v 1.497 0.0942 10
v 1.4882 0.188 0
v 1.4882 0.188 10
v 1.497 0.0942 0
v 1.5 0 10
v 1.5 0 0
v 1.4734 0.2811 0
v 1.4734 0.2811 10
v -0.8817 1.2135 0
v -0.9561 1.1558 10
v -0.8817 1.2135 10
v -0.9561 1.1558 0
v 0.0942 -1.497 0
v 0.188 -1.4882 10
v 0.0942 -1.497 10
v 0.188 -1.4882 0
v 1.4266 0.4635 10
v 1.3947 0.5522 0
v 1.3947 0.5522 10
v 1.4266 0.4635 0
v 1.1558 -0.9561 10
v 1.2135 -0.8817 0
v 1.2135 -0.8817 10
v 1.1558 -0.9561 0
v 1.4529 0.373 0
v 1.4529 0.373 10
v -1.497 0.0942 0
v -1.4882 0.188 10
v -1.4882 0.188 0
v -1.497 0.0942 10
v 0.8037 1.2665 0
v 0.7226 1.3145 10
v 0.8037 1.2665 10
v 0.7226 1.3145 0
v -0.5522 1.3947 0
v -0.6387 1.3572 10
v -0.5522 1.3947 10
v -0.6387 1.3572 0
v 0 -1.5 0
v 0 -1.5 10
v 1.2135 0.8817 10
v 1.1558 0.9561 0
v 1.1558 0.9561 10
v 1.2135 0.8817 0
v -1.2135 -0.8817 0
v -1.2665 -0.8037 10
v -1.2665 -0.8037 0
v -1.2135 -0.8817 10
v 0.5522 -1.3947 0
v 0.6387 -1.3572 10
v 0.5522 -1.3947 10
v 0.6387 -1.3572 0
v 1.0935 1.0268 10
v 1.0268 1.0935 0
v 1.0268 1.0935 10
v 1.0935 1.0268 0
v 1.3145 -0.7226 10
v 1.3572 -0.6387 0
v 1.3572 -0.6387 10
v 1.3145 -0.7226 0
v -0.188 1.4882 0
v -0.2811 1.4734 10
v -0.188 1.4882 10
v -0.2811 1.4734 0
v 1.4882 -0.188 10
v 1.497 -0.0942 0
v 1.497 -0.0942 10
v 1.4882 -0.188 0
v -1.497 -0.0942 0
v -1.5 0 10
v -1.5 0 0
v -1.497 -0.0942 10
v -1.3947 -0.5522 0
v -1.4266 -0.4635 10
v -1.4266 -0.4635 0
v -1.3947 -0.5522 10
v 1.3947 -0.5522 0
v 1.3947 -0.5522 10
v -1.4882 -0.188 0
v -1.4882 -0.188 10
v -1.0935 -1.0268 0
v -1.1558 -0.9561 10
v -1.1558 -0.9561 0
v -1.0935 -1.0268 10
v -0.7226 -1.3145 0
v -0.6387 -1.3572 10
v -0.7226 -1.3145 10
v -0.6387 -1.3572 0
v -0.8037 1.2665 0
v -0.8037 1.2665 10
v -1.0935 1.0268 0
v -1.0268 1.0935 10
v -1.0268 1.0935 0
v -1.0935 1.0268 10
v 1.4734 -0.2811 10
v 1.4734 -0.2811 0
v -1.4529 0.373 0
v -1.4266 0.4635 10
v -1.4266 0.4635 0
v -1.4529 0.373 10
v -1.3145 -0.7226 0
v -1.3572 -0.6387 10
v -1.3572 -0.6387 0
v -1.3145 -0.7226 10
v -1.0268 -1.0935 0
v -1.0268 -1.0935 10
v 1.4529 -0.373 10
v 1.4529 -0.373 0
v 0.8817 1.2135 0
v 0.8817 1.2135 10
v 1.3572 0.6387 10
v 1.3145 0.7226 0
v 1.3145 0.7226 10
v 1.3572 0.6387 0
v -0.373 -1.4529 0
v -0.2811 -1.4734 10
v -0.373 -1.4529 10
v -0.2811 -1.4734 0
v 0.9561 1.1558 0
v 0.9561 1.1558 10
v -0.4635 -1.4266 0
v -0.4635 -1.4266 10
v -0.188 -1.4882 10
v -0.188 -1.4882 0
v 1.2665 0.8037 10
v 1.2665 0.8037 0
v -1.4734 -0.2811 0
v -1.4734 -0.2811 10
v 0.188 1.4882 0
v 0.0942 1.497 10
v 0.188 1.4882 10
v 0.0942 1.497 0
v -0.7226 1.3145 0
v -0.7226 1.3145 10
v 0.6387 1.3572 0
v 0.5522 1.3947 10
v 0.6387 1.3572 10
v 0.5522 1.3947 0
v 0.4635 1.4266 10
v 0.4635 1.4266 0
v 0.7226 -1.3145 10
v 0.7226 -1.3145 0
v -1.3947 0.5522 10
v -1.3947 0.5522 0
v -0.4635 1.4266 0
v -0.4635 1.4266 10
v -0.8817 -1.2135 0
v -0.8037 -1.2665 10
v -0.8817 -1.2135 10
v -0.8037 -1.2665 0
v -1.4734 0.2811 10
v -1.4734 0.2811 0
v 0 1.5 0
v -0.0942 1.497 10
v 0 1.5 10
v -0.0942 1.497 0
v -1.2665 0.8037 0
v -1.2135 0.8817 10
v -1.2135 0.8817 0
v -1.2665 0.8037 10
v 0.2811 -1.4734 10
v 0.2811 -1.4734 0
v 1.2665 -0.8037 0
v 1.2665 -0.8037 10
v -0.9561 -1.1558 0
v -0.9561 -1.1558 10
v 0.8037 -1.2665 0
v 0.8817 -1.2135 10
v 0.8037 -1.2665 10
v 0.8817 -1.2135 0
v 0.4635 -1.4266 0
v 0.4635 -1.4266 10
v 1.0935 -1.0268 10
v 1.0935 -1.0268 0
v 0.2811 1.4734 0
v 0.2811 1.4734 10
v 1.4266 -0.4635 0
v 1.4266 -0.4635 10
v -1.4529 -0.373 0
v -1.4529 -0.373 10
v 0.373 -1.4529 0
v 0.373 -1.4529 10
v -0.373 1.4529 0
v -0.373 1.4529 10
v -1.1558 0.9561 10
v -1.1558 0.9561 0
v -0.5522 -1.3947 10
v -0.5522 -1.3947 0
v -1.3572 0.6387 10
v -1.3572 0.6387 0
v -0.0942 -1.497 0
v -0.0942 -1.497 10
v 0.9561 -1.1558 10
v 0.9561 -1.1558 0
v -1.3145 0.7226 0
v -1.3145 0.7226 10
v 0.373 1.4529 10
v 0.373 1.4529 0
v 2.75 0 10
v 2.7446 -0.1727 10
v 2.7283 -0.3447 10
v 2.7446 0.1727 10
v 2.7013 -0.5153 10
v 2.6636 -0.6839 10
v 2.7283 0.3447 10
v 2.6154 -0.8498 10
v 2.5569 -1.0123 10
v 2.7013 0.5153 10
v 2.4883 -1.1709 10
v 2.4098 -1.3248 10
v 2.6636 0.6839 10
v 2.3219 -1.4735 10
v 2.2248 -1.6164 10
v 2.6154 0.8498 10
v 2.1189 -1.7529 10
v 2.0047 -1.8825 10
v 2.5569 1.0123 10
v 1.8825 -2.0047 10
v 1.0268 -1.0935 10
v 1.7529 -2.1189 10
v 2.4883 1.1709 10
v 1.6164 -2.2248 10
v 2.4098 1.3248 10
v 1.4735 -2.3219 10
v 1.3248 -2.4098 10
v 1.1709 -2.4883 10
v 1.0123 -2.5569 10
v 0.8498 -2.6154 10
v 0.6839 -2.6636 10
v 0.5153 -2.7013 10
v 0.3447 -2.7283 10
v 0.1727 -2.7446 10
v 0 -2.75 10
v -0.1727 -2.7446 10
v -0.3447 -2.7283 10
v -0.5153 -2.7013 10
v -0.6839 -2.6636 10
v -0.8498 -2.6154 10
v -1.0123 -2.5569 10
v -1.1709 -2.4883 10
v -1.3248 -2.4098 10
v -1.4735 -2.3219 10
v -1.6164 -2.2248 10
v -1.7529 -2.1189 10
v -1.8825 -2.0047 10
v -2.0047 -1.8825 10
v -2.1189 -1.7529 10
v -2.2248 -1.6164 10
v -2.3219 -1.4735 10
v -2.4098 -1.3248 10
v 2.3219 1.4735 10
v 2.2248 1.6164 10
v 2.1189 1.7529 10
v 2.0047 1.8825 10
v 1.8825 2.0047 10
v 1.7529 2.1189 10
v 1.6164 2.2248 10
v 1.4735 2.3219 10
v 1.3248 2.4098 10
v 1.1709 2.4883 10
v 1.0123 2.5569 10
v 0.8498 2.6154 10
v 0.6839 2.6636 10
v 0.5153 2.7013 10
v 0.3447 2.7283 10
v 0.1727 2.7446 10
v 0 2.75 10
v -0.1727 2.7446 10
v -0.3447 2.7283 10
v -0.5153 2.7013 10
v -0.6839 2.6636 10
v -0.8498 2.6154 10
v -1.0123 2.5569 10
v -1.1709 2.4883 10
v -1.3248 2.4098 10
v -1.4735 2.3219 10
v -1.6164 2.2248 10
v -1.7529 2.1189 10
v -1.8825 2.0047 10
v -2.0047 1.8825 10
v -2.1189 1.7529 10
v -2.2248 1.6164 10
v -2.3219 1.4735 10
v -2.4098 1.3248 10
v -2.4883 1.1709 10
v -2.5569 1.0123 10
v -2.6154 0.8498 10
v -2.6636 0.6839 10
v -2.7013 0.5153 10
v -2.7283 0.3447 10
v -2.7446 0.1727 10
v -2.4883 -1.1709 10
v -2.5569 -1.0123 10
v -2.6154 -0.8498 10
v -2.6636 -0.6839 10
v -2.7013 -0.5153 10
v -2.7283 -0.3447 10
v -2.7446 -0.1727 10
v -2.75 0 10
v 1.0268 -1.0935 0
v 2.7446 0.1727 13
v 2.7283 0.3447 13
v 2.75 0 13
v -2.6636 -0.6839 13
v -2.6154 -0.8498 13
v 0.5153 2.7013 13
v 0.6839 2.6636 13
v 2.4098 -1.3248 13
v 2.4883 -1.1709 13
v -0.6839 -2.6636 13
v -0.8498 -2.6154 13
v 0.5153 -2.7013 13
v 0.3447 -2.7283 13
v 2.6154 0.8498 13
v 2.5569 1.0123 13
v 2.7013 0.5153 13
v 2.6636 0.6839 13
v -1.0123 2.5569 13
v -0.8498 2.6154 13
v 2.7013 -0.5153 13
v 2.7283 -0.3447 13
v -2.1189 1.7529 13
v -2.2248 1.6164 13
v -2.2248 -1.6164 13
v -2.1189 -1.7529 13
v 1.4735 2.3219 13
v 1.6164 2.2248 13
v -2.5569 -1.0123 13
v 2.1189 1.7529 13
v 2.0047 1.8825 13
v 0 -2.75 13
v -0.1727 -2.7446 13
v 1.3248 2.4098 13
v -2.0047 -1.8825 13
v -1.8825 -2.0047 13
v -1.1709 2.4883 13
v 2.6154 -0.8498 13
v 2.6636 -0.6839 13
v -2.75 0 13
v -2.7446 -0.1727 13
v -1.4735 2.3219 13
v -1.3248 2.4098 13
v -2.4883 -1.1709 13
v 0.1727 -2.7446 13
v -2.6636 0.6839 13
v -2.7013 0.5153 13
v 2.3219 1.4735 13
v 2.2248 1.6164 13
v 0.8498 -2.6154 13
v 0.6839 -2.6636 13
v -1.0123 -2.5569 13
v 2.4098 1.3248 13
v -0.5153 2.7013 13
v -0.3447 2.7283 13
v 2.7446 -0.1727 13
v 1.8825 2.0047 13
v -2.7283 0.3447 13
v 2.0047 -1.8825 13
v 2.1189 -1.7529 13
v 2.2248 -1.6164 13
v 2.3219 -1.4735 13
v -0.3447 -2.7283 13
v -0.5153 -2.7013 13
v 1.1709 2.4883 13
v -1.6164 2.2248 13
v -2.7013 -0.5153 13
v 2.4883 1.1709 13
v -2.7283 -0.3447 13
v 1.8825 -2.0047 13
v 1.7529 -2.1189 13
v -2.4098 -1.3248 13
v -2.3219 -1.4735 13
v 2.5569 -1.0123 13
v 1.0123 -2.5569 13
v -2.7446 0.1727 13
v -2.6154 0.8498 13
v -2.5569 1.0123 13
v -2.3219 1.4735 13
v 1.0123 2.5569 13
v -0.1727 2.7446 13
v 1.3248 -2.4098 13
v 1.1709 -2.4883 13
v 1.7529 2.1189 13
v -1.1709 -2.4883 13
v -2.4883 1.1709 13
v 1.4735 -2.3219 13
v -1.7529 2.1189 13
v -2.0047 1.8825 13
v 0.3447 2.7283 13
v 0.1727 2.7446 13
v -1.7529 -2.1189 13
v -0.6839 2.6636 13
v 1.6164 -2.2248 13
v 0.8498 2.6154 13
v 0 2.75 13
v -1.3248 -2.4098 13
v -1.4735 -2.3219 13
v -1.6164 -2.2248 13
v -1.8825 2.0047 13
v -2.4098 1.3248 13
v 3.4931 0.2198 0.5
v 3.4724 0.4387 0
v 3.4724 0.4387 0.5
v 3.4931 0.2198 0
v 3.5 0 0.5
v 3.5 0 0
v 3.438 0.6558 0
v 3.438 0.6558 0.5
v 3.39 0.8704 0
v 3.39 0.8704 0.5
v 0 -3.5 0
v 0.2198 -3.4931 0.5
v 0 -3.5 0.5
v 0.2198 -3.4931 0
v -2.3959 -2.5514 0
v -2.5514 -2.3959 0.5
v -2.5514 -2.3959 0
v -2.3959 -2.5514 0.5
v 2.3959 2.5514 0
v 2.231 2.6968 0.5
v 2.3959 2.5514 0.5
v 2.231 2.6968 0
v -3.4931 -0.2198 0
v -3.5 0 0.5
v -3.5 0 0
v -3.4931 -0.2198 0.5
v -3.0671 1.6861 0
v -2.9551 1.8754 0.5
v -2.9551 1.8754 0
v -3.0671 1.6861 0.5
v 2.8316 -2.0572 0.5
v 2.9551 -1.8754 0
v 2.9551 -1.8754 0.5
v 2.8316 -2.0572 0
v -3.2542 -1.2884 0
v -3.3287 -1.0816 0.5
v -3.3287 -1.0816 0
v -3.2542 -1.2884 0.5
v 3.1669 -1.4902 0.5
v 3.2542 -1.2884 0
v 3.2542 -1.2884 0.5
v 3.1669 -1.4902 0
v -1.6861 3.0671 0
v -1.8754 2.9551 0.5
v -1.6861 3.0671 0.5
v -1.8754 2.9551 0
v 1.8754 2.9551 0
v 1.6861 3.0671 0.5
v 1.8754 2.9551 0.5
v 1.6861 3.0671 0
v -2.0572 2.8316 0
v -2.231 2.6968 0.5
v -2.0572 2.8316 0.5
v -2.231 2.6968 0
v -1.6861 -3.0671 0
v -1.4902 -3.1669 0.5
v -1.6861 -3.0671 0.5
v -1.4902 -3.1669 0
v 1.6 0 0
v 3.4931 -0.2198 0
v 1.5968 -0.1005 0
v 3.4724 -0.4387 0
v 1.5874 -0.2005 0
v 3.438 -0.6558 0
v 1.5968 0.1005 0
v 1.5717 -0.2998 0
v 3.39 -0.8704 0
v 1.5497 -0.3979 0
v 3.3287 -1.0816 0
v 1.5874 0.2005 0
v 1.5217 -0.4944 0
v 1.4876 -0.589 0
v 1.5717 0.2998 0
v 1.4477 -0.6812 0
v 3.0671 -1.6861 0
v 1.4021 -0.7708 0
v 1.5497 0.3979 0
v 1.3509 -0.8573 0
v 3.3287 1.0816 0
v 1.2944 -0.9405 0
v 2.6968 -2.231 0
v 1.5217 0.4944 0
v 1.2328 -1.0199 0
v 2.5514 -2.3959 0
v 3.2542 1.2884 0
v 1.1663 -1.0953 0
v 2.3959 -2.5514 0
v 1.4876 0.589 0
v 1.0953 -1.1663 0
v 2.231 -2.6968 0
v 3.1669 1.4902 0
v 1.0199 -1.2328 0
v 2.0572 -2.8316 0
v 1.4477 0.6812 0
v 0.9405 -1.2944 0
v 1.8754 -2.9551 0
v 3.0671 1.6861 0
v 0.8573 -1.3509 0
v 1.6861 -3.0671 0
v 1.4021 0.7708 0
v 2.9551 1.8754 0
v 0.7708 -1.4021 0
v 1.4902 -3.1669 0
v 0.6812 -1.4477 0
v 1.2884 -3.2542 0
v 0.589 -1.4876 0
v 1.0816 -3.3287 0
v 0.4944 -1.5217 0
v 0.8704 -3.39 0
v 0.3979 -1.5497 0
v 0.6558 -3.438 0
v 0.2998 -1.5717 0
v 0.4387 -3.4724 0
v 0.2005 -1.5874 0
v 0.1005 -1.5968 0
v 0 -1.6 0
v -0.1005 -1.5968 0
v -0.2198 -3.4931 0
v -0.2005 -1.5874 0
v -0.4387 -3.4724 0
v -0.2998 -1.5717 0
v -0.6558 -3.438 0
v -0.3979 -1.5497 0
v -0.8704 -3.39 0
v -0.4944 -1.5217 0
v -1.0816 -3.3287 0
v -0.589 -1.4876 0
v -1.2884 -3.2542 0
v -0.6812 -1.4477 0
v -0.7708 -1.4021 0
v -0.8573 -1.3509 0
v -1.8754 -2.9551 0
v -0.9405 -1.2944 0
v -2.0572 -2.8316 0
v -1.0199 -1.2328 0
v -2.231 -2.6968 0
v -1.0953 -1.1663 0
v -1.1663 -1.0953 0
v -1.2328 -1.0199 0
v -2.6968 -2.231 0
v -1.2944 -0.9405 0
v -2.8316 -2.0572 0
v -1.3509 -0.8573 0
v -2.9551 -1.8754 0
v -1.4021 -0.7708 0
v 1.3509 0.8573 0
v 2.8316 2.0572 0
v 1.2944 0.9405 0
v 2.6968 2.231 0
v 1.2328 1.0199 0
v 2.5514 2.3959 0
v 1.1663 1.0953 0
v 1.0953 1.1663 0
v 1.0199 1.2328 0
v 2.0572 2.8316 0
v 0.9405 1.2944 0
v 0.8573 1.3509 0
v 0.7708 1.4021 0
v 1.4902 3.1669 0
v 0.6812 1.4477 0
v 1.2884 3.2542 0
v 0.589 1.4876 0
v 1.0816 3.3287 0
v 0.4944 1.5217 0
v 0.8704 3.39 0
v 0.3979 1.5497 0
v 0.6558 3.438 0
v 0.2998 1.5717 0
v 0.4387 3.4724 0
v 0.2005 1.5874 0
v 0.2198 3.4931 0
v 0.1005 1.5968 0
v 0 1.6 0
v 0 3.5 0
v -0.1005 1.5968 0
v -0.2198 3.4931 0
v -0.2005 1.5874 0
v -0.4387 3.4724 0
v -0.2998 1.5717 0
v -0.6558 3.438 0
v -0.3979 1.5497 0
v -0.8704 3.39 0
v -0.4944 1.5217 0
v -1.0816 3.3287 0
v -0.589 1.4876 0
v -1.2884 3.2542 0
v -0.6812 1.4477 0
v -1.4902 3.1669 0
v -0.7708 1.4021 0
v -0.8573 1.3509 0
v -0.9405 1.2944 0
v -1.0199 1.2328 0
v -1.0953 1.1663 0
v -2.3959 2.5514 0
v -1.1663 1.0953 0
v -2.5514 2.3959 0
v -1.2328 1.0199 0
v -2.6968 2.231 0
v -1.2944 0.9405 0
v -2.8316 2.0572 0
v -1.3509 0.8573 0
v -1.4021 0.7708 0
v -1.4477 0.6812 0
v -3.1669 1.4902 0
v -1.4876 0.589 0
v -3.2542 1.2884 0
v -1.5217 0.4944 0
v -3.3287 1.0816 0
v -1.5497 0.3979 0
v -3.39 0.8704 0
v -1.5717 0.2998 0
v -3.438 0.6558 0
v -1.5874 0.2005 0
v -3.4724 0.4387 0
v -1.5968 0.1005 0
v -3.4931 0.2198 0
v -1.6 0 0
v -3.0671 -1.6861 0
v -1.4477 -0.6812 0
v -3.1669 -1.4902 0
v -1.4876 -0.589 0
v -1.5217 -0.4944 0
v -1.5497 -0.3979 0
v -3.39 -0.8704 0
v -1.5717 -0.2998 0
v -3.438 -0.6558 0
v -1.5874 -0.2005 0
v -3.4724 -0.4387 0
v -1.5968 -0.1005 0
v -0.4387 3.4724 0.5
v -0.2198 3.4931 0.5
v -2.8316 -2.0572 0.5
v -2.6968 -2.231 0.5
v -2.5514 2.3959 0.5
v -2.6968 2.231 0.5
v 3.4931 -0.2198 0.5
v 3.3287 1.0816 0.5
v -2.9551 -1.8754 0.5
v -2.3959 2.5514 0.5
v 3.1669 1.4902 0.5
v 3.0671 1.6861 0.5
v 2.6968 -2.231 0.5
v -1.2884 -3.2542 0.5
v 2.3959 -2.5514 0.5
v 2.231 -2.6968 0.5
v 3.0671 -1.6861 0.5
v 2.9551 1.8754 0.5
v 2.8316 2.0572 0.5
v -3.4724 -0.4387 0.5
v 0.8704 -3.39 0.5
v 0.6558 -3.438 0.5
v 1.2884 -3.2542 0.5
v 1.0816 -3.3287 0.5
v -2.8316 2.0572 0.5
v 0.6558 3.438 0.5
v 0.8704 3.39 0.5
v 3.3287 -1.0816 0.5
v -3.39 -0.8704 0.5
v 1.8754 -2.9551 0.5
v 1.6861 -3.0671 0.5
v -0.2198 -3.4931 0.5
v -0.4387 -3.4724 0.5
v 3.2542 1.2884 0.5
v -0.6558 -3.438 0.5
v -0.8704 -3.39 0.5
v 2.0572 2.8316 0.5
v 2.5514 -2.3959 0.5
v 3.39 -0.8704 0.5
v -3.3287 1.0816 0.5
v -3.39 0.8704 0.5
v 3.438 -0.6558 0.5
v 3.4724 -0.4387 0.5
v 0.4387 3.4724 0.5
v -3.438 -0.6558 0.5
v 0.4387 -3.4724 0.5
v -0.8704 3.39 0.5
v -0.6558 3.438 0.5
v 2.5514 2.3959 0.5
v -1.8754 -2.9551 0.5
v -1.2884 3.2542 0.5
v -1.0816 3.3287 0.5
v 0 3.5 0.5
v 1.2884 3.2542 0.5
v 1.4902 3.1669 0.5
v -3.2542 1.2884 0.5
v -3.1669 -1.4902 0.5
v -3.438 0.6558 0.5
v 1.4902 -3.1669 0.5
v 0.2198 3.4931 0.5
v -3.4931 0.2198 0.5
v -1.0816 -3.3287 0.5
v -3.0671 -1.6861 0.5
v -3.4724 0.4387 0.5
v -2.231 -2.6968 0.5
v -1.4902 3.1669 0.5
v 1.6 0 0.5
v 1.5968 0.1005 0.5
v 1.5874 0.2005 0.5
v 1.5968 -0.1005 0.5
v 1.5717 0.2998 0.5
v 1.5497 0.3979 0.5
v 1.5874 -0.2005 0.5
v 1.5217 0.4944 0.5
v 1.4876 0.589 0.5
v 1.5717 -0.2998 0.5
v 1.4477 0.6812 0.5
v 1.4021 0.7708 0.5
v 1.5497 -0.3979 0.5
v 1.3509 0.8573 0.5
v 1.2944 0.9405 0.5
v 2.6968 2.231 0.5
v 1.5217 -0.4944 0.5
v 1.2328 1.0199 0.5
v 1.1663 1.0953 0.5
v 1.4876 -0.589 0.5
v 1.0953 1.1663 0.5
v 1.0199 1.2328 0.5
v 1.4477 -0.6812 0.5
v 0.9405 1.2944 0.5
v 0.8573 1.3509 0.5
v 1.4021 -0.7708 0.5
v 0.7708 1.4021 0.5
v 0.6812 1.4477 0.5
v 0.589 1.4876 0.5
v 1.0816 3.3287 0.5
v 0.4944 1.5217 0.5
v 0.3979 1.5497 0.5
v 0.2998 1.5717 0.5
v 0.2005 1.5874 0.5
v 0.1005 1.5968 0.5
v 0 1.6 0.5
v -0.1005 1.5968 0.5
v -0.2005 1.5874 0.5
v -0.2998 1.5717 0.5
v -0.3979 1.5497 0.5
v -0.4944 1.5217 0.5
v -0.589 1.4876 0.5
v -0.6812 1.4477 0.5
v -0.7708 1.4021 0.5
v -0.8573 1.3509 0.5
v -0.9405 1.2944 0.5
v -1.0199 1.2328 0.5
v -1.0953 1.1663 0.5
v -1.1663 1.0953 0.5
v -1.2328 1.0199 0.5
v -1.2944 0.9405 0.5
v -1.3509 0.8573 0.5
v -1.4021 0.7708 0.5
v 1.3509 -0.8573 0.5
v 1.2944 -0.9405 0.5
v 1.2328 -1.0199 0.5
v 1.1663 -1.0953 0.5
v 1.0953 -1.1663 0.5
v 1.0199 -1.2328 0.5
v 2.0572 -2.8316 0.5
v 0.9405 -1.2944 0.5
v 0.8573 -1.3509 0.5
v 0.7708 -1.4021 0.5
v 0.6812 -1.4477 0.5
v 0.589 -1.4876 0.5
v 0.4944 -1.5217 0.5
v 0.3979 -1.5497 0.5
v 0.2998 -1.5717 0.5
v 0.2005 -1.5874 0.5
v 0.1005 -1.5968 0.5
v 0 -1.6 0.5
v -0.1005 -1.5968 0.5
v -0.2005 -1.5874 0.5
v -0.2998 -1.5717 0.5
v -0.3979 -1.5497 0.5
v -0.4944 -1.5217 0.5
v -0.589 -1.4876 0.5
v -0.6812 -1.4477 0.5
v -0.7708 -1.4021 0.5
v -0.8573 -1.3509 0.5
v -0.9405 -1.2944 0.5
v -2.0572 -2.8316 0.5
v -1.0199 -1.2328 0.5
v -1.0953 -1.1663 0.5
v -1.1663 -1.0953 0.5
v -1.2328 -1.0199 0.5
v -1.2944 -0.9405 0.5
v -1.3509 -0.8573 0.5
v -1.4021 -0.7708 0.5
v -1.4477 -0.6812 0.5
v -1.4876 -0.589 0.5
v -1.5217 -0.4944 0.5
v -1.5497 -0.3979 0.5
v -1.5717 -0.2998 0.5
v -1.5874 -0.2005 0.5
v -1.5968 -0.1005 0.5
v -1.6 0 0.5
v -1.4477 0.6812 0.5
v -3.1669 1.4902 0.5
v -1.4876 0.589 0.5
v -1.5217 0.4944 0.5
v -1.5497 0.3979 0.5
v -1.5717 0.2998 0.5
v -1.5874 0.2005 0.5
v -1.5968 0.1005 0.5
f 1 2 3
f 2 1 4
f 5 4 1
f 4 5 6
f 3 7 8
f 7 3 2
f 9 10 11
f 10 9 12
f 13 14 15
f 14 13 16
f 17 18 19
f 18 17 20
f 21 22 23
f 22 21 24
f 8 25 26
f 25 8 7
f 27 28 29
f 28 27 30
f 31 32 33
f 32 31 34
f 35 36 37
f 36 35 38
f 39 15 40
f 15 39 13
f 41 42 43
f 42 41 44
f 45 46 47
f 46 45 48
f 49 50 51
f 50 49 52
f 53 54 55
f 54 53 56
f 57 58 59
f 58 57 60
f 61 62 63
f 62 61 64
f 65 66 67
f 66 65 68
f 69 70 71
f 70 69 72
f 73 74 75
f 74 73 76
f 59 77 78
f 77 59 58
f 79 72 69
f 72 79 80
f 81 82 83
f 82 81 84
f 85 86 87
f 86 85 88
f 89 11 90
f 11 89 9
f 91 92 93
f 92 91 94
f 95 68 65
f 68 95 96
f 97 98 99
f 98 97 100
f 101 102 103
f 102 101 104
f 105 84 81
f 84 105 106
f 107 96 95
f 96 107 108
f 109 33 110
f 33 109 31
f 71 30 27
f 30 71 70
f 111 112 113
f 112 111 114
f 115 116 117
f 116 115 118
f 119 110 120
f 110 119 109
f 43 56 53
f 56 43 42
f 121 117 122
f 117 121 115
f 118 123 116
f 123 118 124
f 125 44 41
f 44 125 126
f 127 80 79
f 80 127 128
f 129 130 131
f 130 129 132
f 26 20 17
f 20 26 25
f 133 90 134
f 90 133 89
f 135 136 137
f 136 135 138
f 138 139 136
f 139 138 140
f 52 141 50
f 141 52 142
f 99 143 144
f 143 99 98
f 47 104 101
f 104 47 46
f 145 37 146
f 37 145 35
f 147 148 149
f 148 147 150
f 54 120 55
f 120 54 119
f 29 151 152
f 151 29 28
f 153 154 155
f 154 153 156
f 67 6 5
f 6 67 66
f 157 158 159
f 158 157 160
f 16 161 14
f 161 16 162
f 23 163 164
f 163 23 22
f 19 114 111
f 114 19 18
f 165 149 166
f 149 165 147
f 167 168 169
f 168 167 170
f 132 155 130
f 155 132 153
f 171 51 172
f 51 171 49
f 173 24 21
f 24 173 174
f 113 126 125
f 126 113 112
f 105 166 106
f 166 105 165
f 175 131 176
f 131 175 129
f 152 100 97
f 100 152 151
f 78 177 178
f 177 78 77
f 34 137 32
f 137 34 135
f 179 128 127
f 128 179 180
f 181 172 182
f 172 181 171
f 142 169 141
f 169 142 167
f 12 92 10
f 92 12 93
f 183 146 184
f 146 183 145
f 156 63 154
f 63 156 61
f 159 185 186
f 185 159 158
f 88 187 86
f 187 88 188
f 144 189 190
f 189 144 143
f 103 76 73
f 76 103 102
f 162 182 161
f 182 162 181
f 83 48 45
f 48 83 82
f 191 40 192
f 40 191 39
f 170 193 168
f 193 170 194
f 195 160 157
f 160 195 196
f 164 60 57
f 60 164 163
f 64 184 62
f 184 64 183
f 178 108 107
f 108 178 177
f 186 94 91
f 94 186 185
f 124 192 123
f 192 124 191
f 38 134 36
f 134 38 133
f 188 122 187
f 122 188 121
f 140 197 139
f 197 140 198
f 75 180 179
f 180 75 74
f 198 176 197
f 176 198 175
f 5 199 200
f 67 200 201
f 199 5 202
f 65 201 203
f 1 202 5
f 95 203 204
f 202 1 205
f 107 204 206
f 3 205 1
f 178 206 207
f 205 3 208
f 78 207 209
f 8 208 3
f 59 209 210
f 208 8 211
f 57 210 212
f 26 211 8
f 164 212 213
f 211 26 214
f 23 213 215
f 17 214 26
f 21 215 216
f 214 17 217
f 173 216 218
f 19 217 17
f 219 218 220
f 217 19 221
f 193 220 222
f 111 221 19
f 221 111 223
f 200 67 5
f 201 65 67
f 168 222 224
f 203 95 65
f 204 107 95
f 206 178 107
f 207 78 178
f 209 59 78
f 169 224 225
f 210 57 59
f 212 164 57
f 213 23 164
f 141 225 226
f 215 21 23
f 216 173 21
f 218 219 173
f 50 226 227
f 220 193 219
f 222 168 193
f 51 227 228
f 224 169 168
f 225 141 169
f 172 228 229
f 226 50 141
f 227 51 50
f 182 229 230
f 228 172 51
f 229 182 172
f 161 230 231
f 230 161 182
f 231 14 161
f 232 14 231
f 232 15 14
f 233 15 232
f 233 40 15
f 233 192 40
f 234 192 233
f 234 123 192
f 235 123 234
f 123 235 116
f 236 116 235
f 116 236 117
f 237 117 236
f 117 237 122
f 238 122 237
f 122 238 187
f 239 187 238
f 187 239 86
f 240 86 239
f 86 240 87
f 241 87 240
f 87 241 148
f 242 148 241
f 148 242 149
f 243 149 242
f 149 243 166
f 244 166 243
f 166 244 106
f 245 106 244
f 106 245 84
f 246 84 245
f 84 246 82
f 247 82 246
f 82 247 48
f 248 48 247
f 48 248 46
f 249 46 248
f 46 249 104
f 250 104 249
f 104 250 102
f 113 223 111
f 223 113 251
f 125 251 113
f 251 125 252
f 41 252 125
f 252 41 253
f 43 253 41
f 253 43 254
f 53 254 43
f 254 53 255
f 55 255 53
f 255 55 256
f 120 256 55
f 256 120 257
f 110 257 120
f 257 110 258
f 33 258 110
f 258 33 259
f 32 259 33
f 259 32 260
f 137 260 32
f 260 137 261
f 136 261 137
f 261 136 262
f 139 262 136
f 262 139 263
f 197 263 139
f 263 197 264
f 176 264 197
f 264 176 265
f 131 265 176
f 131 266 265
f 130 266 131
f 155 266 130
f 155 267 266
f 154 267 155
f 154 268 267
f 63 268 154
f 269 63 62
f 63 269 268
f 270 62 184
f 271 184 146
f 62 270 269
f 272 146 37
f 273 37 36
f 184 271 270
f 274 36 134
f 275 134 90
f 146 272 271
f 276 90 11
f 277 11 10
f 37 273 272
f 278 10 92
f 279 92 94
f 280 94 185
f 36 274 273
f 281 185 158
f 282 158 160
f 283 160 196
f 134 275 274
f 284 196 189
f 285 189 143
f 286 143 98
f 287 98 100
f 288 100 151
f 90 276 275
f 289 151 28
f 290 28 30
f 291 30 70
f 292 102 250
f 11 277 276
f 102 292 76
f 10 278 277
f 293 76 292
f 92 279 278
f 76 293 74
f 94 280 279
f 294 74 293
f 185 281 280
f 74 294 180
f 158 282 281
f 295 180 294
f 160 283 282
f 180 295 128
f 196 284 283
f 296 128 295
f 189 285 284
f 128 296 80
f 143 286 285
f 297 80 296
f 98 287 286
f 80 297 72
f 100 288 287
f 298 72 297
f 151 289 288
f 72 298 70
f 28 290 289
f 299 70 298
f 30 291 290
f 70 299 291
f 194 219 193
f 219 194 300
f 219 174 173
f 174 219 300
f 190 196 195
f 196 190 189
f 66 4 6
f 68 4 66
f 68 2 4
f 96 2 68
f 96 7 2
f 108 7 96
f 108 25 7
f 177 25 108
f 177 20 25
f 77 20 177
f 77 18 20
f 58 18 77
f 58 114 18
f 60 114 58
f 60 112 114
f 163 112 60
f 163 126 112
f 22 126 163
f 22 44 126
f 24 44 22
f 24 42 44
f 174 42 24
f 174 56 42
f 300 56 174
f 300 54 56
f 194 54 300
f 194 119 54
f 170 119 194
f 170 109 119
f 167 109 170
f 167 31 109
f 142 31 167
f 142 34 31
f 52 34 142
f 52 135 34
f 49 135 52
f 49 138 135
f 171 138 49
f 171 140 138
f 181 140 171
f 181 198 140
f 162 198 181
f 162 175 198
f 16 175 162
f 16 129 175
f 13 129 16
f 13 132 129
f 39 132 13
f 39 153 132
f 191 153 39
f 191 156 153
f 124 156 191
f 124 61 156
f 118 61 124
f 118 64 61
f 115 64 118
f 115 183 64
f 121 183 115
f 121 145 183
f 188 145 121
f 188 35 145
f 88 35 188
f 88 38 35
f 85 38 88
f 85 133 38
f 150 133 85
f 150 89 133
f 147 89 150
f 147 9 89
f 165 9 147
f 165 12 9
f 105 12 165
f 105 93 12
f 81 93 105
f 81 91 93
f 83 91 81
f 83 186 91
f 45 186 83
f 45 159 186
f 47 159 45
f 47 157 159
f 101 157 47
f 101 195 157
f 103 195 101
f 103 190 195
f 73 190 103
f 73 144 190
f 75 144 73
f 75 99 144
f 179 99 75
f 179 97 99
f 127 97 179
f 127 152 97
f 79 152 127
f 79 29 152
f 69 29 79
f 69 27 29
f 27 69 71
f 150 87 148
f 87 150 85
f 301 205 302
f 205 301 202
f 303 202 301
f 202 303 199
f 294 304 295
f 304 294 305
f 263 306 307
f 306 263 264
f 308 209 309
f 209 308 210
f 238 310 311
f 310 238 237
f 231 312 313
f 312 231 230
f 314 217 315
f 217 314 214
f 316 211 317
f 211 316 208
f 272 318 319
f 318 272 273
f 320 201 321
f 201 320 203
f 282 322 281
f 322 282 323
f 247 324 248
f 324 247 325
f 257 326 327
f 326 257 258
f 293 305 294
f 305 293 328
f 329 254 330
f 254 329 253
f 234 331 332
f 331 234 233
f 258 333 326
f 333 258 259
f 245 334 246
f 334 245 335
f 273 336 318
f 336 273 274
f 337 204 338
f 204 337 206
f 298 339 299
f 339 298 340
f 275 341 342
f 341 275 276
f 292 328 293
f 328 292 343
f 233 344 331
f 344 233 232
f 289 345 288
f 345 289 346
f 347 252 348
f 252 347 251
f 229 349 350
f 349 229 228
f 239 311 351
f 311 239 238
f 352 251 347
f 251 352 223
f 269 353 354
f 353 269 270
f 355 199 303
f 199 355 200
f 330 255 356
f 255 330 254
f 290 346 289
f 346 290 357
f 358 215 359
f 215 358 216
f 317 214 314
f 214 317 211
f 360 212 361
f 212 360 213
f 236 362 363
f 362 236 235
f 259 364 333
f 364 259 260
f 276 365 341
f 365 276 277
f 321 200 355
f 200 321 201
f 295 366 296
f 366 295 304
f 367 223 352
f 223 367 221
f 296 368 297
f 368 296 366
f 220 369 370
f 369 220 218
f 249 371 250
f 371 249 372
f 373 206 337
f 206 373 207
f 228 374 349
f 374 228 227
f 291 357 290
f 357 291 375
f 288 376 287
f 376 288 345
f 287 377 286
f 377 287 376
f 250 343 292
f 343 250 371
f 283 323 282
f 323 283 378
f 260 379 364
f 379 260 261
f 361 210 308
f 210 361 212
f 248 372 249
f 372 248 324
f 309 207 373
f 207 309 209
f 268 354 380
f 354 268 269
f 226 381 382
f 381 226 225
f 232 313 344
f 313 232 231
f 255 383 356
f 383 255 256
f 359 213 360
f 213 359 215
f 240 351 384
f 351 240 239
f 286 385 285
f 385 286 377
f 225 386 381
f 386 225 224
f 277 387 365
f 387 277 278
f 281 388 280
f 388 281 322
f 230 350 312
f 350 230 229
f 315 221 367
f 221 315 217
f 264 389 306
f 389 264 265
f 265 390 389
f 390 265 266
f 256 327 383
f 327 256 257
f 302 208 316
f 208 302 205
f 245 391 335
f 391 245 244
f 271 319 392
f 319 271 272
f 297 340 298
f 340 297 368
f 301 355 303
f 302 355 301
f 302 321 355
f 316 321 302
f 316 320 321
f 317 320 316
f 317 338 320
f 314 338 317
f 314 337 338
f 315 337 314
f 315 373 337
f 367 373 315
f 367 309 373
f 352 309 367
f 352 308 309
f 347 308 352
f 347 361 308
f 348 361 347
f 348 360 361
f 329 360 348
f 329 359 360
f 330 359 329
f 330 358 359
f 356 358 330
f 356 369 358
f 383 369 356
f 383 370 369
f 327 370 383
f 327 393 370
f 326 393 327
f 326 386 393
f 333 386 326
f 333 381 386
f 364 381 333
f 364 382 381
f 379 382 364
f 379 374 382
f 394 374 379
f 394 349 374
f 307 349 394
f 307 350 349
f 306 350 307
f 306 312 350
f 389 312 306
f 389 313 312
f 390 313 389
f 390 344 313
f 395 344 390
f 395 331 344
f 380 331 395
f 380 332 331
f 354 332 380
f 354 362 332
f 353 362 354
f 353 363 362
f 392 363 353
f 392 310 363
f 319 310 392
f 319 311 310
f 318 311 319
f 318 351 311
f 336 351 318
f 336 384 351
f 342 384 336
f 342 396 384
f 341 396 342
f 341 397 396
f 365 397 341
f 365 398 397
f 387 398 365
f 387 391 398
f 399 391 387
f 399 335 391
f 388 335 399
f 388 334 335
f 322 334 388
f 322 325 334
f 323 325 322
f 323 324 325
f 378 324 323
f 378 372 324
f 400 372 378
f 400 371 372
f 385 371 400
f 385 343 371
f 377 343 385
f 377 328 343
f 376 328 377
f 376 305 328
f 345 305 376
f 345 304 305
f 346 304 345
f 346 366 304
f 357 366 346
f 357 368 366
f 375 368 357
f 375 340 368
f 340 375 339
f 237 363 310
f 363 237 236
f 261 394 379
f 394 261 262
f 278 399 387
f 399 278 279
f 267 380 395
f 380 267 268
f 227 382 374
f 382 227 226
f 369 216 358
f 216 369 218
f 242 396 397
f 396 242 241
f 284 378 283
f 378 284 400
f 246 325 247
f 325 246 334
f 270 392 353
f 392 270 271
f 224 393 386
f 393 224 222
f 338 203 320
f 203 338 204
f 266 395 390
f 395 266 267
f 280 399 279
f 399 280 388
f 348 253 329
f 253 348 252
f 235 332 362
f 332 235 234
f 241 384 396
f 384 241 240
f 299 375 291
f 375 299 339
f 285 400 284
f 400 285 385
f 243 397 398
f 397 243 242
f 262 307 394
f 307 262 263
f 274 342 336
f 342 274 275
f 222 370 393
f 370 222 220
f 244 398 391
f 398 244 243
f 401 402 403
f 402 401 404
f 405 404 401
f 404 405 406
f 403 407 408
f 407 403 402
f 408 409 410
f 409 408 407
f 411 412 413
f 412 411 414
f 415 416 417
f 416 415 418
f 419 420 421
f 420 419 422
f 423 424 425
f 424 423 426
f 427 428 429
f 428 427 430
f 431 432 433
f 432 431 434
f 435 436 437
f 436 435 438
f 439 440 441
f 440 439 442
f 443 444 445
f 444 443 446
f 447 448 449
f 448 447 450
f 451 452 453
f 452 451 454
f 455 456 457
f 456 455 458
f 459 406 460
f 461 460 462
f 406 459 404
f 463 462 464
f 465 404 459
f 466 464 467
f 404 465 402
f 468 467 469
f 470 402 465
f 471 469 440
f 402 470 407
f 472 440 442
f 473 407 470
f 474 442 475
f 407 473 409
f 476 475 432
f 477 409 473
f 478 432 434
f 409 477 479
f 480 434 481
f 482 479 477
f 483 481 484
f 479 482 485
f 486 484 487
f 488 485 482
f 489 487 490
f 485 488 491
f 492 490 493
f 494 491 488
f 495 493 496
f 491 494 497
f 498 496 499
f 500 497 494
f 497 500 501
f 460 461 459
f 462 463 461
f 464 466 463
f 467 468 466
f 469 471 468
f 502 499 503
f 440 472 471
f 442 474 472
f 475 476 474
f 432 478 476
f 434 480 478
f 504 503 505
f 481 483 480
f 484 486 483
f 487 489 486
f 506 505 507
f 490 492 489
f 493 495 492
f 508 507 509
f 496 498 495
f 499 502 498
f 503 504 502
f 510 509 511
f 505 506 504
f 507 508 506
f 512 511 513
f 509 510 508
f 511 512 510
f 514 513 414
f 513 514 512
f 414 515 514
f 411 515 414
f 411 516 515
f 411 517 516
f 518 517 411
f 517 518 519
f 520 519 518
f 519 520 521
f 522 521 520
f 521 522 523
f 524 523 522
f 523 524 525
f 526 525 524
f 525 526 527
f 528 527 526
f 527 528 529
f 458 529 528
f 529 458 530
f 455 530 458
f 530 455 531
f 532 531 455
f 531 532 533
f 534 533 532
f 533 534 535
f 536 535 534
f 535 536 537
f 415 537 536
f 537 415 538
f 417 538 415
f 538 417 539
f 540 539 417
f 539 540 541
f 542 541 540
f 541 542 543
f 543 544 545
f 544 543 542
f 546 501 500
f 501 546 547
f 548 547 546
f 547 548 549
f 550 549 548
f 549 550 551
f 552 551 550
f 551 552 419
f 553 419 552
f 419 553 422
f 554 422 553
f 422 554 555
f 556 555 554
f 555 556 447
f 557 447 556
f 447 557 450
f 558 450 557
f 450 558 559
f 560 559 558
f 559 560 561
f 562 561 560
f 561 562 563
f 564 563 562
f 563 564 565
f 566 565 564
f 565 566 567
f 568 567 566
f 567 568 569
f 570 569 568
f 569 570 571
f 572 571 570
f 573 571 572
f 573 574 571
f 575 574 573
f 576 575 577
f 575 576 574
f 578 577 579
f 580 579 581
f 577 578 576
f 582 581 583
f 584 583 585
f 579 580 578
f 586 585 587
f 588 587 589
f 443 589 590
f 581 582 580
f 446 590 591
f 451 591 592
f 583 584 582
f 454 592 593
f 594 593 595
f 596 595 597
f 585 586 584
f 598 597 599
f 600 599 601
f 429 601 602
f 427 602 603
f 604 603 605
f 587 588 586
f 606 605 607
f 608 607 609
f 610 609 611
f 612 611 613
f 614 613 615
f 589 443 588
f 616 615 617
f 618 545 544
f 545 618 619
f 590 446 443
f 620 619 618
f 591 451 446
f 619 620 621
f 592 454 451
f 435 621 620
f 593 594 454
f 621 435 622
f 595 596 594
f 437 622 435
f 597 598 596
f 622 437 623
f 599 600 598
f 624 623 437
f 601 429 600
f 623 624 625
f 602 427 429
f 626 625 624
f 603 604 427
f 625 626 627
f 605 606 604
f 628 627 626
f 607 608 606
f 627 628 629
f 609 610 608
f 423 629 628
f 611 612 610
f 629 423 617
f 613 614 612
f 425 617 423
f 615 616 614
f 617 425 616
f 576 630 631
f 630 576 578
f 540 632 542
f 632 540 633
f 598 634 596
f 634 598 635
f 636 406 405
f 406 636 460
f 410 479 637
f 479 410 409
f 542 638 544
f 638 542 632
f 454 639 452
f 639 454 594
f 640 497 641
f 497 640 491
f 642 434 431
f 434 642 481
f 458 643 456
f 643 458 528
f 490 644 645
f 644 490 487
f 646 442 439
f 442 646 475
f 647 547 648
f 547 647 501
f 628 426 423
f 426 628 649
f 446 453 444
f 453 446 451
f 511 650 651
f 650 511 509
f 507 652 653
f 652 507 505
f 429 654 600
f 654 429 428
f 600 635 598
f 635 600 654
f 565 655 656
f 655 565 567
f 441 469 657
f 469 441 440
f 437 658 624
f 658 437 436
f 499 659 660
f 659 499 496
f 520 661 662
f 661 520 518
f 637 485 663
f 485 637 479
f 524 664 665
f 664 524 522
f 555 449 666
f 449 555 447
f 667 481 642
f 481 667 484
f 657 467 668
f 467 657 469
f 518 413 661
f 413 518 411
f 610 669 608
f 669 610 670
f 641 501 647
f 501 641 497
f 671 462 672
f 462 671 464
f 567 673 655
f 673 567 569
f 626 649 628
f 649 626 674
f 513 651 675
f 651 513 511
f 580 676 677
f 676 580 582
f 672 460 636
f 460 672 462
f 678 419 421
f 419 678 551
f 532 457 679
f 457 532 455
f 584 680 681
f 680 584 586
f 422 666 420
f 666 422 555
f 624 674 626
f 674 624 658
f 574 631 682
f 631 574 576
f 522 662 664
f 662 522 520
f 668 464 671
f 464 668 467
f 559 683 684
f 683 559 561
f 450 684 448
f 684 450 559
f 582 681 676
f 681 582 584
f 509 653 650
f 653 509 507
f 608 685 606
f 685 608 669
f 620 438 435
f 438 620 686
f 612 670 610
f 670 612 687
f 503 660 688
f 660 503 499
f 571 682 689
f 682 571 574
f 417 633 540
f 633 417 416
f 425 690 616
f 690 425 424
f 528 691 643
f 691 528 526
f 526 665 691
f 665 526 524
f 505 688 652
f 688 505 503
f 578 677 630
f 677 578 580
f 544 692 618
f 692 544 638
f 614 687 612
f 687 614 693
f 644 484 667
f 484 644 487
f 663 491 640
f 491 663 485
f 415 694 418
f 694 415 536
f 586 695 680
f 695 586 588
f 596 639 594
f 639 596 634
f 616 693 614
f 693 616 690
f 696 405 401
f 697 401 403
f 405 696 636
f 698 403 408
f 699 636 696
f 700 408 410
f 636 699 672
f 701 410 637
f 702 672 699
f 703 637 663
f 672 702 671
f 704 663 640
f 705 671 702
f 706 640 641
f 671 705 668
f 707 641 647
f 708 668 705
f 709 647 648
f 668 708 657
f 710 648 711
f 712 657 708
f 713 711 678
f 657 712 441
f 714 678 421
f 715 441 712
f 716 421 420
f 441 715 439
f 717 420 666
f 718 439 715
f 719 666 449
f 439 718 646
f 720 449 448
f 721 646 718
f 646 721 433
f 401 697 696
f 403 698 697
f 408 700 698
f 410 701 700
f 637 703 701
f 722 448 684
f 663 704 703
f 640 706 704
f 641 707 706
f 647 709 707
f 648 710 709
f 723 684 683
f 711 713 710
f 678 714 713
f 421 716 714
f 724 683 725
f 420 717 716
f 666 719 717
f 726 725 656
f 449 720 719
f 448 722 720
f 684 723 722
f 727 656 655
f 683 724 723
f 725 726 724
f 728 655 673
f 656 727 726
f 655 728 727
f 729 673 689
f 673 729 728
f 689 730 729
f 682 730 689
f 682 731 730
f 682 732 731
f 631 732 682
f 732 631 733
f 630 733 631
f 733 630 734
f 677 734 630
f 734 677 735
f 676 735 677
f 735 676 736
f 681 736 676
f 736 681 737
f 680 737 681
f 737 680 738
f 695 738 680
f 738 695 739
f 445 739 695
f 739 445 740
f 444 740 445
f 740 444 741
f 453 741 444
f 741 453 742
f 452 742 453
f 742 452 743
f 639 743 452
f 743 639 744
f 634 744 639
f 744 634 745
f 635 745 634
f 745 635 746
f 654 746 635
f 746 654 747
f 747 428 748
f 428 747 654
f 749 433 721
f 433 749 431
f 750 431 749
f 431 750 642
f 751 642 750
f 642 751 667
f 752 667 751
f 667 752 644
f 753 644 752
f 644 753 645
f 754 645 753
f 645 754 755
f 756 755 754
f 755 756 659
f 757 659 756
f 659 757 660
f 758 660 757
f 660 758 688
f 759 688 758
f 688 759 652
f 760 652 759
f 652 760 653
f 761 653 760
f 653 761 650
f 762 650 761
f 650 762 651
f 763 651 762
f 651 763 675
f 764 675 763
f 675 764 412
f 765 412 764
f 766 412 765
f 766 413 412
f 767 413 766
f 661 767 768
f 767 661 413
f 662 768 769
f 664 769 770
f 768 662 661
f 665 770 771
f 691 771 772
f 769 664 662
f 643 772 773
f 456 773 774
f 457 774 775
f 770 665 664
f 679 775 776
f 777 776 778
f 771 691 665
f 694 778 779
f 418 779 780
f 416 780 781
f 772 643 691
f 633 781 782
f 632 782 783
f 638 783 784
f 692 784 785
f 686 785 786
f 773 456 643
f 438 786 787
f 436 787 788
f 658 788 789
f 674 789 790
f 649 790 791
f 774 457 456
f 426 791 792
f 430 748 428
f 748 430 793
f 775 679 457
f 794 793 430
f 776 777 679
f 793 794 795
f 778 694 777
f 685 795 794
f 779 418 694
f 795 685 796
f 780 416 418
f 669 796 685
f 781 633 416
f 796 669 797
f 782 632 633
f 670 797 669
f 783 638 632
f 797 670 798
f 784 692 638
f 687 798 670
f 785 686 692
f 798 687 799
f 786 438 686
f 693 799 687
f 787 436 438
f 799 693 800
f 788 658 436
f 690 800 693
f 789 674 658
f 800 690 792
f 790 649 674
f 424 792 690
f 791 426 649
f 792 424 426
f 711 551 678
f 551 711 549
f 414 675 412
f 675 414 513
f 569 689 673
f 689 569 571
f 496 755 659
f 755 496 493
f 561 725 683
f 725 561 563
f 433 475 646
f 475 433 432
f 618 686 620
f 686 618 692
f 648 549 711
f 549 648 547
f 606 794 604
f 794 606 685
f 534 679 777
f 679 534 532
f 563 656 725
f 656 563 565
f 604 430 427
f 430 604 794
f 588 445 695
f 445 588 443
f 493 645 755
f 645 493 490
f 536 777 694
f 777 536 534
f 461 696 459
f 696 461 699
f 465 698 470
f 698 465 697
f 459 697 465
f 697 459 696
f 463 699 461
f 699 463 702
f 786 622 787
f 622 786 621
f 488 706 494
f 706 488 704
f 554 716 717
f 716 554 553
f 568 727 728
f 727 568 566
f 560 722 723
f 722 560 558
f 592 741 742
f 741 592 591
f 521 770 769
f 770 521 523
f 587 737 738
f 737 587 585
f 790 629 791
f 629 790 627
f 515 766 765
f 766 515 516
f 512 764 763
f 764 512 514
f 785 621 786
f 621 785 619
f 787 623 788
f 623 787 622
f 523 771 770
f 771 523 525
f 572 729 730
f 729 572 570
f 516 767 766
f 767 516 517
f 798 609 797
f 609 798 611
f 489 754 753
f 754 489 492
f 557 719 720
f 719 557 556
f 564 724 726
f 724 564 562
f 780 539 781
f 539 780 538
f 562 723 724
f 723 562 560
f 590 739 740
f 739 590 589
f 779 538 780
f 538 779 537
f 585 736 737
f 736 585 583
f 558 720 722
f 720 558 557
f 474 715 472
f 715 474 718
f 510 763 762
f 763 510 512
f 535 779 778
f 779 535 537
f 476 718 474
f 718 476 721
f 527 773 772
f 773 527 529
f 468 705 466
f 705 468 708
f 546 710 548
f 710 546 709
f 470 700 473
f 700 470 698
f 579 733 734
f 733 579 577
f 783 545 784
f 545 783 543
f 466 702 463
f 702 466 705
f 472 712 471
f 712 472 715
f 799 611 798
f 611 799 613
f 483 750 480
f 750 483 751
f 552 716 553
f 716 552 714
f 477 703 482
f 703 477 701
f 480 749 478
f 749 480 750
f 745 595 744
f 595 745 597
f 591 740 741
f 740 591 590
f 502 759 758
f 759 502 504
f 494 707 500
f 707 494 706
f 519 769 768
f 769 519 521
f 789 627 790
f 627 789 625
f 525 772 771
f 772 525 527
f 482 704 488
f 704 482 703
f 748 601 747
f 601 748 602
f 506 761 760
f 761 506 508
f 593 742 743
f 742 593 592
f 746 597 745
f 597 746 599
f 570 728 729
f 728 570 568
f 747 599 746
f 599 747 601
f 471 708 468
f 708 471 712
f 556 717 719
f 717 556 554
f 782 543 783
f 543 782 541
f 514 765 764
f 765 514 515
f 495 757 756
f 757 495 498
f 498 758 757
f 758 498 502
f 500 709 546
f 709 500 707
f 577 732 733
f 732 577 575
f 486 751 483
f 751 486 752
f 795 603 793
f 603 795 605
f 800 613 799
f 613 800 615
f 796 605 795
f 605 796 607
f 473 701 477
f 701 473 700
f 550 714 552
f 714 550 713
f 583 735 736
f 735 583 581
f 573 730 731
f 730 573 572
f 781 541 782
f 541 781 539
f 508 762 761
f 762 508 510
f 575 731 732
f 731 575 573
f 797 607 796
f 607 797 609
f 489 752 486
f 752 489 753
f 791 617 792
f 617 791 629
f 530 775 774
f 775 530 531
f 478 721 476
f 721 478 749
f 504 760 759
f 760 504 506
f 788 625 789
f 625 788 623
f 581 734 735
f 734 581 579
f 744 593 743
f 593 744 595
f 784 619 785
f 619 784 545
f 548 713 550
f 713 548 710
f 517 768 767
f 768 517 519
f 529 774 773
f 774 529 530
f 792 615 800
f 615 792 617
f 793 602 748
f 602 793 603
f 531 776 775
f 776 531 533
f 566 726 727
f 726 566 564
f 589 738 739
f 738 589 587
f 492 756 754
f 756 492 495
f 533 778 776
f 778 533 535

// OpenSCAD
$fn=100;
m3bolt(10);
m3washer();

module m3bolt(length) {
	color("DarkSlateGrey"){
		cylinder(r=1.5, h=length);
		translate([0,0,length]){
			cylinder(r=5.5/2, h=3);
		}
	}
}

module m3washer() {
	color("Silver")
	difference() {
		cylinder(r=7/2, h=0.5);
		cylinder(r=3.2/2, h=0.5);
	}
}
